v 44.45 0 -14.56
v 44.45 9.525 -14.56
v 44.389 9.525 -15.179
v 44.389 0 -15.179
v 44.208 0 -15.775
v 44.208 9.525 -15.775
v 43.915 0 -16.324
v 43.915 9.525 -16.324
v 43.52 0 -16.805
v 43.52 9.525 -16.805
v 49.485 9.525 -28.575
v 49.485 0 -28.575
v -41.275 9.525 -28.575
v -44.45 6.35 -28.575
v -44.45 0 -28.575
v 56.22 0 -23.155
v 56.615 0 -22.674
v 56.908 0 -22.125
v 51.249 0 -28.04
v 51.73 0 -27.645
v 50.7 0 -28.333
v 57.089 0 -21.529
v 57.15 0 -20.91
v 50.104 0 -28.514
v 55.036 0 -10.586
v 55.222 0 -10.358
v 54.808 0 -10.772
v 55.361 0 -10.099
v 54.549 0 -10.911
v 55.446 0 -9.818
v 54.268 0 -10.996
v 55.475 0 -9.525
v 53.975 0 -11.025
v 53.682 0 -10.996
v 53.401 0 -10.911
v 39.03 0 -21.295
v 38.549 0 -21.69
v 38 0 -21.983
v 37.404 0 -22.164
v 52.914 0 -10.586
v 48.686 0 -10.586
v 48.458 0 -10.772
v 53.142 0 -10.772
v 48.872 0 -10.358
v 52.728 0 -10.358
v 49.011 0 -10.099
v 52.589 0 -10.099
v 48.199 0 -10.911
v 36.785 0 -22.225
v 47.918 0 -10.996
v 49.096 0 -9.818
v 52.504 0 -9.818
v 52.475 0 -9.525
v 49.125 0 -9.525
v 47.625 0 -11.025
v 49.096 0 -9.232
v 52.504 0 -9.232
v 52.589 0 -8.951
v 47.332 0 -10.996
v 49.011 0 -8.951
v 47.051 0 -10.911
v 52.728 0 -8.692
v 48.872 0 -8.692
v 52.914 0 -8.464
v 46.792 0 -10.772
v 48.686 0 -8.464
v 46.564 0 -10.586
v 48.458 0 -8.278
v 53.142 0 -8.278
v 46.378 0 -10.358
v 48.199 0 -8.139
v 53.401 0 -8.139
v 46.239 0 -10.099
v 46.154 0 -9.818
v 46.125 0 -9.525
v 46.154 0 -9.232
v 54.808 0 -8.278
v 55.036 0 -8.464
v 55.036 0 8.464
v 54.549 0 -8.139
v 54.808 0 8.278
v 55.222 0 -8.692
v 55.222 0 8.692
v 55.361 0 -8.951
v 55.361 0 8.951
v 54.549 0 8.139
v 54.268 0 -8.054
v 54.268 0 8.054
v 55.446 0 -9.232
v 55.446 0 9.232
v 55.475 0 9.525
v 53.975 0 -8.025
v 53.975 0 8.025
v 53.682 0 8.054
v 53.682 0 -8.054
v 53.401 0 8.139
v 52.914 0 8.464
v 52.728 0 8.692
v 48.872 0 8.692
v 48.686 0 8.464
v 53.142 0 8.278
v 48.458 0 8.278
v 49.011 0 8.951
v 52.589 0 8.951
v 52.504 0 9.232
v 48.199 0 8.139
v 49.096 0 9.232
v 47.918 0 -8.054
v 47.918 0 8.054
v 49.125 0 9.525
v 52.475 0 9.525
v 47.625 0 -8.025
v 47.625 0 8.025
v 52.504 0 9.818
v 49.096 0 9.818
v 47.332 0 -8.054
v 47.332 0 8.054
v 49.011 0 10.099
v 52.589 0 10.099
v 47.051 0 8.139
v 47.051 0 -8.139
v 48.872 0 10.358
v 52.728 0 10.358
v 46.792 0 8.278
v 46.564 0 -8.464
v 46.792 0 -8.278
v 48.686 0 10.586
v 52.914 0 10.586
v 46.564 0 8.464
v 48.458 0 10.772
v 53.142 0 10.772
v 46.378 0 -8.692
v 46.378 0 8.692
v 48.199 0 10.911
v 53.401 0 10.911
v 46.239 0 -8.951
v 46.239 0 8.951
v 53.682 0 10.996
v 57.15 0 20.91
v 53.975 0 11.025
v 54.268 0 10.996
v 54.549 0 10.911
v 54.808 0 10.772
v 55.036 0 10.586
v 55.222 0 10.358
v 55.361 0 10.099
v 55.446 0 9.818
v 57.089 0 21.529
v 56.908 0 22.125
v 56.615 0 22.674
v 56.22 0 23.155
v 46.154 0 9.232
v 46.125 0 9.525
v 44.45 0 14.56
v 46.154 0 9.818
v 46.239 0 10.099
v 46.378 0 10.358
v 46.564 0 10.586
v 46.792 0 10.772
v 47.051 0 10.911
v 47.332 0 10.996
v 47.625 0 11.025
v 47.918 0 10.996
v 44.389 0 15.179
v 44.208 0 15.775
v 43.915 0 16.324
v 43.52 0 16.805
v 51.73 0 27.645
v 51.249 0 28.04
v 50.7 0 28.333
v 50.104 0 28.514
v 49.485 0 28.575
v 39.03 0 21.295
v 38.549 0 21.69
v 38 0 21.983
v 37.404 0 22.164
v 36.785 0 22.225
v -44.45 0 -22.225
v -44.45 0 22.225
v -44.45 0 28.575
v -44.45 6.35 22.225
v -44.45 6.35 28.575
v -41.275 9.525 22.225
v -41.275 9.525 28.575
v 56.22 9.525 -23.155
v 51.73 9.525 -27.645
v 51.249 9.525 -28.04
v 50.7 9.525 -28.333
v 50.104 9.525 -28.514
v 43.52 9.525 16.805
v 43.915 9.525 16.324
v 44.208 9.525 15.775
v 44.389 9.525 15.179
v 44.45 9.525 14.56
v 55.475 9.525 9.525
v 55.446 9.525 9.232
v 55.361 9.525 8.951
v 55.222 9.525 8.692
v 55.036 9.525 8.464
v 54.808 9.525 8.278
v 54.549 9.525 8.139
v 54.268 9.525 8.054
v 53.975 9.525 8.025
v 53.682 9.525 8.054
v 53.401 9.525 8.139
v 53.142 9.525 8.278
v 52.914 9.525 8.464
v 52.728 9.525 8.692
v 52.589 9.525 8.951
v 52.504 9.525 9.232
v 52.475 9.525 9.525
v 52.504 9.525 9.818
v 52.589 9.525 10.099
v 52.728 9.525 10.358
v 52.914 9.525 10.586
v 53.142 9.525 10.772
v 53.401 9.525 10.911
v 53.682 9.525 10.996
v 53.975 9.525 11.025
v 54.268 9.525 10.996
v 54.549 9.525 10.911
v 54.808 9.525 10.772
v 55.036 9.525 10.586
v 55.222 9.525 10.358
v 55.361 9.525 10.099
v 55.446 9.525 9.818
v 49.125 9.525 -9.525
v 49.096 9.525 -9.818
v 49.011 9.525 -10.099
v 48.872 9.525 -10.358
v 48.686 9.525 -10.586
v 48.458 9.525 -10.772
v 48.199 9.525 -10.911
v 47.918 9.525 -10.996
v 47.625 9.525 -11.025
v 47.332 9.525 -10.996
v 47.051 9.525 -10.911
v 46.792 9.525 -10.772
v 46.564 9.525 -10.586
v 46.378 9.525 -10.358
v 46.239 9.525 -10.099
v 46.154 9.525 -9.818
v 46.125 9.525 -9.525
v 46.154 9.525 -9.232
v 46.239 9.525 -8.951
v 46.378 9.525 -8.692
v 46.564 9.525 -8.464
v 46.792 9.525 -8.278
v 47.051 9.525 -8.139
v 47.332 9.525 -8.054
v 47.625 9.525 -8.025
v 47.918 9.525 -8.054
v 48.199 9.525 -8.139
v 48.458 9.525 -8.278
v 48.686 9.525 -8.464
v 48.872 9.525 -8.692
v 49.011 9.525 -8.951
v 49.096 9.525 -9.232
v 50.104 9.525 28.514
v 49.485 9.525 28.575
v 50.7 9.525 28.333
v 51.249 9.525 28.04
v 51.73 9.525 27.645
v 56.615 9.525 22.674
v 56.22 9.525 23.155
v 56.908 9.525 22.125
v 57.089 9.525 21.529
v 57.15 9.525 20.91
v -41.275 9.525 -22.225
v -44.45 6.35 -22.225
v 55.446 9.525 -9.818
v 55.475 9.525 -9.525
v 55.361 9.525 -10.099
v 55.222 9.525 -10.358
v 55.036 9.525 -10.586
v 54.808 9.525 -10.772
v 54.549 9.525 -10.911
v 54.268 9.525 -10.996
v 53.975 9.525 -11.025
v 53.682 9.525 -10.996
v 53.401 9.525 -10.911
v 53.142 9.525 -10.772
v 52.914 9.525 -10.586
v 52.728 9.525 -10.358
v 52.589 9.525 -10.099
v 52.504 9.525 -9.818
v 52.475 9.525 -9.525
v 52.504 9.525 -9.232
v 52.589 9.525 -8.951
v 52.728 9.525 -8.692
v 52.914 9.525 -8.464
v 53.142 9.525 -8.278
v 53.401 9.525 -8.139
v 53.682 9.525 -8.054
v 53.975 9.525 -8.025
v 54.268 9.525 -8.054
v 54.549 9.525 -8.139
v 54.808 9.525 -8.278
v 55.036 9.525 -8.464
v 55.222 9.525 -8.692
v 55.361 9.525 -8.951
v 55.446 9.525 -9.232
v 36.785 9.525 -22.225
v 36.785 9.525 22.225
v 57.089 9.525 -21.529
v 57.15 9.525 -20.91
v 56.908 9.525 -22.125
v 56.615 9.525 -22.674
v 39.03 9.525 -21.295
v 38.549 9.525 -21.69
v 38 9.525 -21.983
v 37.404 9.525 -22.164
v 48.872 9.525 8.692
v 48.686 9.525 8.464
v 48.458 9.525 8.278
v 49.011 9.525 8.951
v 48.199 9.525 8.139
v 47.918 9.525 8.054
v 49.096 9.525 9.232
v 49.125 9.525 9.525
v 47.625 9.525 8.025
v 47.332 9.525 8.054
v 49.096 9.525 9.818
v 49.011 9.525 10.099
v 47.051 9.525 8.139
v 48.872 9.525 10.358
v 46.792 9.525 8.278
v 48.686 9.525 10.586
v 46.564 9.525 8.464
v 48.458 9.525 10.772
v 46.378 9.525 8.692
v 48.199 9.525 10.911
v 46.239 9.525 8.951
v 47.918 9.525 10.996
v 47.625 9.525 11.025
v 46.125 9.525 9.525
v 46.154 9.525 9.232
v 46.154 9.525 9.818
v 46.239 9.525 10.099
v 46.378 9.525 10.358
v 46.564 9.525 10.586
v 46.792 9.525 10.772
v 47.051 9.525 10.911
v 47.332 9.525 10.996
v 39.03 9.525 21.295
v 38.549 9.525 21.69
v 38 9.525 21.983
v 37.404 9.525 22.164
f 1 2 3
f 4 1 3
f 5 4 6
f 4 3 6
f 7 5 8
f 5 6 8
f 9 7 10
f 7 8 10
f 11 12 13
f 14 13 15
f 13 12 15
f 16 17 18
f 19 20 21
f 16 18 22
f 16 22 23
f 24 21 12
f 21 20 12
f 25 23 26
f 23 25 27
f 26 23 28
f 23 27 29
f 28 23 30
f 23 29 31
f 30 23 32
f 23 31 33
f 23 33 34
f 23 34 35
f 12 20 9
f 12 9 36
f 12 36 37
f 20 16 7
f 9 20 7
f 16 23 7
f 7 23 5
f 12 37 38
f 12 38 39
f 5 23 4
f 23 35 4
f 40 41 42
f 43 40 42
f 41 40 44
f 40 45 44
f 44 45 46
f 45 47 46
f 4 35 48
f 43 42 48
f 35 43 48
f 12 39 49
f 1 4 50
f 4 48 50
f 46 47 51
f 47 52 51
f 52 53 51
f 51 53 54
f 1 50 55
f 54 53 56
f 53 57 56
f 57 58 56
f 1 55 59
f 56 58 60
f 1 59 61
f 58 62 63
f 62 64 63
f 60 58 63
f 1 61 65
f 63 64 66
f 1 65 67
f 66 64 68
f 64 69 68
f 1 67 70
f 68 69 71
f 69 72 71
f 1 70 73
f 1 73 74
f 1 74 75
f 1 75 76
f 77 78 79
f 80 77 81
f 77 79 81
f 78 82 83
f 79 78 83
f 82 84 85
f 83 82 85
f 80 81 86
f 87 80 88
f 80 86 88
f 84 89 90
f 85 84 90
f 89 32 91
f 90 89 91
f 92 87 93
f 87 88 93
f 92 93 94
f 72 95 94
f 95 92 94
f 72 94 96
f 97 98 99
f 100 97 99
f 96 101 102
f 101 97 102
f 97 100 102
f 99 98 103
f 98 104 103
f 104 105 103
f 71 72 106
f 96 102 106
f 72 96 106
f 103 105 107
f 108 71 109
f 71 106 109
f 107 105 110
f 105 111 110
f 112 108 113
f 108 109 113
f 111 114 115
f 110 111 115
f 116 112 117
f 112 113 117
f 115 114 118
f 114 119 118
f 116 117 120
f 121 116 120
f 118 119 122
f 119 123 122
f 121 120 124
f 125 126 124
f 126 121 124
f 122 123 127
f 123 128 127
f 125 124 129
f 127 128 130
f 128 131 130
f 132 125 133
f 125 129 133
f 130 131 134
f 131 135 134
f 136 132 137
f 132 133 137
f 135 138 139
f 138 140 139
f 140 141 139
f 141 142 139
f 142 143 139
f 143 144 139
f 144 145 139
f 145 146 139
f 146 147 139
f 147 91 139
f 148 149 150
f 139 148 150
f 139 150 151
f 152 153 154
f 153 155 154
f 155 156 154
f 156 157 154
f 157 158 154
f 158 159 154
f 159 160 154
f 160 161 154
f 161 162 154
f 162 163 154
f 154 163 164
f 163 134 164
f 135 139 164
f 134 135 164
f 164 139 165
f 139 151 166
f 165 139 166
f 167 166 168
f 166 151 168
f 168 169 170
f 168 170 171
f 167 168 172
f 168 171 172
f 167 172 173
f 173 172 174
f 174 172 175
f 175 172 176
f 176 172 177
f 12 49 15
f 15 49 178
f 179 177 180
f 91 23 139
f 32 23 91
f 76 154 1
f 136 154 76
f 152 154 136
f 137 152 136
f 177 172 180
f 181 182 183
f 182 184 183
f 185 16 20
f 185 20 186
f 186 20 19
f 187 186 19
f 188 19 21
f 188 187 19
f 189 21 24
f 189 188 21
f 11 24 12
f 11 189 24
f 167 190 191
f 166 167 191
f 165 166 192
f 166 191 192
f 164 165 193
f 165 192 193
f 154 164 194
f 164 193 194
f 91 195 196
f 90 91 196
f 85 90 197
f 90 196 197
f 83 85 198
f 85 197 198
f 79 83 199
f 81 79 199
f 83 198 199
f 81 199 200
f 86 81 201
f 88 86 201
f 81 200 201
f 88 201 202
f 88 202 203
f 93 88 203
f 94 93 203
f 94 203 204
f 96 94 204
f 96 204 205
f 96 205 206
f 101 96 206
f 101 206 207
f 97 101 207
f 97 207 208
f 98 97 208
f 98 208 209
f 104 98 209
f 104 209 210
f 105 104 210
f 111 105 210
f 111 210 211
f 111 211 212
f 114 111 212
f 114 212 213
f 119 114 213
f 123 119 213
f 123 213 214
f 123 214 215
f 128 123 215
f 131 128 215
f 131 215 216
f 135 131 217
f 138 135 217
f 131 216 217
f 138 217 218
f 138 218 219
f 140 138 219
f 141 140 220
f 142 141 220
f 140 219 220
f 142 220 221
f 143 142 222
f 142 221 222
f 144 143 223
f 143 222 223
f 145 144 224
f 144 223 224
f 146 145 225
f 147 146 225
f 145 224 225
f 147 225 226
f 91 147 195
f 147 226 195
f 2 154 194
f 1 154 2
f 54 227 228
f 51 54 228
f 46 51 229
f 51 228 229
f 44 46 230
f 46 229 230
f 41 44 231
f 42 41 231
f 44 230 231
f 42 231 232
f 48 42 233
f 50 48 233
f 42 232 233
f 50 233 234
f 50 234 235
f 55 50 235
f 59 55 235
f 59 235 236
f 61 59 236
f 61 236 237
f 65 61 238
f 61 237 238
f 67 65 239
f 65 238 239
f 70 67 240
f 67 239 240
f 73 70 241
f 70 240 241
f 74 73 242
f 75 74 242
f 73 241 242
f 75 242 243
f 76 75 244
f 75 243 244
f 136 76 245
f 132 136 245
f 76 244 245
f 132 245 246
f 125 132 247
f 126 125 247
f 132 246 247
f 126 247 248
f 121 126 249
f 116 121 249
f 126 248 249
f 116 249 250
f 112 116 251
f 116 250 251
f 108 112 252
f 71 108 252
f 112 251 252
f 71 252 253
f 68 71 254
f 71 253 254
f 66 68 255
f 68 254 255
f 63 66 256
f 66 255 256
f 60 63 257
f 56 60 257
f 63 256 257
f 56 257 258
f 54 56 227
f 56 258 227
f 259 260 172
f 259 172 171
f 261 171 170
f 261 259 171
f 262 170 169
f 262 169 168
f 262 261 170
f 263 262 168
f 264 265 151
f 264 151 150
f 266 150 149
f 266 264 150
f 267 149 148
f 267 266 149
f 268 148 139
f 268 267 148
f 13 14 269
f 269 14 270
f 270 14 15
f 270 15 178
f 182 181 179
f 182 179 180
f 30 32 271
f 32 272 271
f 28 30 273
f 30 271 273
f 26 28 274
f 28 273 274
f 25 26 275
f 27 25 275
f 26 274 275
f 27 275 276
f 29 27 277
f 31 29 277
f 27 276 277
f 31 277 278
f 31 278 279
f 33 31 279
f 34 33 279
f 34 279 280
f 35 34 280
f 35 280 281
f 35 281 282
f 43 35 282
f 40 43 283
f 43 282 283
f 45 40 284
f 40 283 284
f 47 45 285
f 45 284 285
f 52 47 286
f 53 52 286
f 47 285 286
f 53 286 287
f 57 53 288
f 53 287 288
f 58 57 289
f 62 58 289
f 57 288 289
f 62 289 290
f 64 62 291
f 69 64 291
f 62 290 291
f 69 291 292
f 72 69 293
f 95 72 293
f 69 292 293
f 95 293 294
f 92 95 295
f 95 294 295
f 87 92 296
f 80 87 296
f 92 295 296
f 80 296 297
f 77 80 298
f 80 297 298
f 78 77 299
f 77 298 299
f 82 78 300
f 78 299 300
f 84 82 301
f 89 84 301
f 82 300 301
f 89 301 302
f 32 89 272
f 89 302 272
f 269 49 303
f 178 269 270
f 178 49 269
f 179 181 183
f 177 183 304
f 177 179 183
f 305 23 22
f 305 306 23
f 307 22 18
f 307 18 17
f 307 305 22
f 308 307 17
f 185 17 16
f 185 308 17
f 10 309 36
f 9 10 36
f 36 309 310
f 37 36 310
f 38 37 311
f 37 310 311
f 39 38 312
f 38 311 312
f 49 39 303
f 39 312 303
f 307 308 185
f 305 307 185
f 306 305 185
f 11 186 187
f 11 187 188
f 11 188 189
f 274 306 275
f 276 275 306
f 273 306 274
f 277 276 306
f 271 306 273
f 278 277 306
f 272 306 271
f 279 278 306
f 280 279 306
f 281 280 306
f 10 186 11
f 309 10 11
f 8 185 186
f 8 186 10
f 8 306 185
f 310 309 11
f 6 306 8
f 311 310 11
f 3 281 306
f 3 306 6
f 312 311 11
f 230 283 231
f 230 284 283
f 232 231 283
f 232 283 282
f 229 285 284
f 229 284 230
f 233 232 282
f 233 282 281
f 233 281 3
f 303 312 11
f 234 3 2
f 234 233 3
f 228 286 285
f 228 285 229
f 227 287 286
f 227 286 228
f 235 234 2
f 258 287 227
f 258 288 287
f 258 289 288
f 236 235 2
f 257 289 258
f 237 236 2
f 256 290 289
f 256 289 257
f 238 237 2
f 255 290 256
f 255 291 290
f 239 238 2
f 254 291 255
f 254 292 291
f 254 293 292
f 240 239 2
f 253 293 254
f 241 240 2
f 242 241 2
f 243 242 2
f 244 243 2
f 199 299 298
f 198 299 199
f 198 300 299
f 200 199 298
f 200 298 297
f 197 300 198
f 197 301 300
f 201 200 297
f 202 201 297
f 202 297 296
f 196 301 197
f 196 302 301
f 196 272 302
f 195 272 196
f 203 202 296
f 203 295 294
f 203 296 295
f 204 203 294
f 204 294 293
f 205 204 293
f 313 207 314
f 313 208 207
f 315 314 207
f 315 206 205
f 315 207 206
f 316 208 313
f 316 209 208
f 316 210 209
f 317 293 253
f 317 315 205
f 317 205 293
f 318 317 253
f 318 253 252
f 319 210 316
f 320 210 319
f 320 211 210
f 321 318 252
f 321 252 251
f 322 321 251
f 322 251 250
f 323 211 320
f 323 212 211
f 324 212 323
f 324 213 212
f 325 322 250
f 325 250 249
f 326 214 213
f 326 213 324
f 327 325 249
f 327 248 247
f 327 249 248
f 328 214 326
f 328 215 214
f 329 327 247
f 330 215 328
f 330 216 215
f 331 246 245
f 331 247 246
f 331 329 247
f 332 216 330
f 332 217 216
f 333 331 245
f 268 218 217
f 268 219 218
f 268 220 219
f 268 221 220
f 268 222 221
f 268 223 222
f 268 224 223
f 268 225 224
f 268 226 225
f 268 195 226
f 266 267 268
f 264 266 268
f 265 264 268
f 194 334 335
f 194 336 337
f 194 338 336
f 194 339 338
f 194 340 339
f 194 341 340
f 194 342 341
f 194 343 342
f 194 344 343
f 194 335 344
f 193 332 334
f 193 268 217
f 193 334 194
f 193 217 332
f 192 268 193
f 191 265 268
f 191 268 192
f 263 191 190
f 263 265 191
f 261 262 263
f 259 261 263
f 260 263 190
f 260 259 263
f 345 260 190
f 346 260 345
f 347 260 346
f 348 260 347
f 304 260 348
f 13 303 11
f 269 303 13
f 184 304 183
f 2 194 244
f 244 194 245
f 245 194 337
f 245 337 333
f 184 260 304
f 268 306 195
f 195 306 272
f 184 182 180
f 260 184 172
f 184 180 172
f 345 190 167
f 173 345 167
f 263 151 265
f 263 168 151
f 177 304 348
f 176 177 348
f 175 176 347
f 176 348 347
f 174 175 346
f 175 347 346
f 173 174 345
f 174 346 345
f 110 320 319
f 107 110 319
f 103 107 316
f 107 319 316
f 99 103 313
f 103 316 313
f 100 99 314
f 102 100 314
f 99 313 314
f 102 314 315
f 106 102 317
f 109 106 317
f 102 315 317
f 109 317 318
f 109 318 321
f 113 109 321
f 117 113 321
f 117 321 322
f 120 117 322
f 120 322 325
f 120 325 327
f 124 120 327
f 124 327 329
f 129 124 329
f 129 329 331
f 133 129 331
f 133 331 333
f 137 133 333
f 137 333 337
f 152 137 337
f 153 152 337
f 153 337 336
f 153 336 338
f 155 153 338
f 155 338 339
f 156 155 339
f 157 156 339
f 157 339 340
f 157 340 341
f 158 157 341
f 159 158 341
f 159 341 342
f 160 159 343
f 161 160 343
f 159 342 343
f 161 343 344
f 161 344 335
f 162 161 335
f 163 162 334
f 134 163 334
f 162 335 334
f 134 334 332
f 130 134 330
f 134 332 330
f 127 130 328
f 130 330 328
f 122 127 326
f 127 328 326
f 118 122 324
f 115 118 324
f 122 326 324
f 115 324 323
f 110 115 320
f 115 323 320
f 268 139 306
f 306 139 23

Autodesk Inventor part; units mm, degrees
ref_plane "YZ Plane" through (0, 0, 0) normal (1, 0, 0) x (0, 1, 0)
ref_plane "XZ Plane" through (0, 0, 0) normal (0, 1, 0) x (-1, 0, 0)
ref_plane "XY Plane" through (0, 0, 0) normal (0, 0, 1) x (1, 0, 0)
sketch "Sketch1" plane through (0, 0, 0) normal (0, 1, 0) x (-1, 0, 0)
  line L0 (44.45, 22.225) -> (-44.45, 22.225)
  line L1 (-44.45, 22.225) -> (-44.45, -22.225)
  line L2 (-44.45, -22.225) -> (44.45, -22.225)
  line L3 (44.45, -22.225) -> (44.45, 22.225)
  line L4 (44.45, 22.225) -> (-44.45, -22.225) construction
  line L5 (-44.45, 22.225) -> (44.45, -22.225) construction
  line L6 (0, 0) -> (-44.45, 0) construction
  line L7 (44.45, 28.575) -> (-57.15, 28.575)
  line L8 (-57.15, 28.575) -> (-57.15, -28.575)
  line L9 (-57.15, -28.575) -> (44.45, -28.575)
  line L10 (44.45, -28.575) -> (44.45, 28.575)
  line L11 (44.45, 28.575) -> (-57.15, -28.575) construction
  line L12 (-57.15, 28.575) -> (44.45, -28.575) construction
  point P0 (-6.35, 0)
  point P1 (44.45, 22.225)
  dimension "d0" = 88.9
  dimension "d1" = 44.45
  dimension "d2" = 6.35
  dimension "d3" = 12.7
extrude "Extrusion1" add sketch "Sketch1" along normal blind 9.525 contours L0 L1 L2 L10 L9 L8 L7
chamfer "Chamfer1" distance 6.35 angle 45 4 edges at (44.45, 4.7625, 22.225) (57.15, 4.7625, 28.575) (44.45, 4.7625, -22.225) (57.15, 4.7625, -28.575)
fillet "Fillet1" radius 3.175 8 edges at (38.1, 4.7625, 22.225) (44.45, 4.7625, 15.875) (44.45, 4.7625, -15.875) (38.1, 4.7625, -22.225) (50.8, 4.7625, -28.575) (57.15, 4.7625, -22.225) (57.15, 4.7625, 22.225) (50.8, 4.7625, 28.575)
sketch "Sketch2" plane through (57.15, 0, 20.9099) normal (1, 0, 0) x (0, 0, -1)
  line L0 (35.4697, 9.525) -> (6.35, 9.525) projected
  line L1 (20.9099, 9.525) -> (20.9099, 0) construction
  line L2 (35.4697, 0) -> (6.35, 0) projected
  circle A0 centre (20.9099, 4.7625) radius 3.175 construction
  circle A1 centre (20.9099, 11.1125) radius 3.175
  line L3 (20.9099, 17.1125) -> (20.9099, 5.1125) construction
  line L4 (19.4099, 17.1125) -> (19.4099, 5.1125)
  line L5 (22.4099, 5.1125) -> (22.4099, 17.1125)
  arc A2 (22.4099, 17.1125) -> (19.4099, 17.1125) centre (20.9099, 17.1125) ccw
  arc A3 (19.4099, 5.1125) -> (22.4099, 5.1125) centre (20.9099, 5.1125) ccw
  point P0 (18.1602, 9.525)
  point P1 (23.6595, 9.525)
  point P2 (22.4099, 8.3142)
  point P3 (19.4099, 8.3142)
  dimension "d10" = 6.35
  dimension "d20" = 6.35
  dimension "d21" = 6.35
  dimension "d22" = 3
  dimension "d23" = 12
sketch "Sketch4" plane through (0, 9.525, 0) normal (0, 1, 0) x (1, 0, 0)
  line L0 (44.45, 14.5599) -> (44.45, -14.5599) projected
  line L1 (44.45, 0) -> (57.15, 0) construction
  line L2 (57.15, -20.9099) -> (57.15, 20.9099) projected
  line L3 (47.625, -9.525) -> (53.975, -9.525) construction
  line L4 (53.975, -9.525) -> (53.975, 9.525) construction
  line L5 (53.975, 9.525) -> (47.625, 9.525) construction
  line L6 (47.625, 9.525) -> (47.625, -9.525) construction
  line L7 (47.625, -9.525) -> (53.975, 9.525) construction
  line L8 (53.975, -9.525) -> (47.625, 9.525) construction
  circle A0 centre (47.625, -9.525) radius 1.5
  circle A1 centre (47.625, 9.525) radius 1.5
  circle A2 centre (53.975, -9.525) radius 1.5
  circle A3 centre (53.975, 9.525) radius 1.5
  point P0 (0, 0)
  point P1 (50.8, 0)
  dimension "d27" = 6.35
  dimension "d28" = 19.05
  dimension "d29" = 3
  dimension "d32" = 19.05
  dimension "d35" = 6.35
extrude "Extrusion5" cut sketch "Sketch4" against normal through all
chamfer "Chamfer2" distance 3.175 angle 45 2 edges at (-44.45, 9.525, -25.4) (-44.45, 9.525, 25.4)
equation "\"d32\" = d28"
equation "\"d35\" = d27"
properties part number "Rack" material "Aluminum 6061"
